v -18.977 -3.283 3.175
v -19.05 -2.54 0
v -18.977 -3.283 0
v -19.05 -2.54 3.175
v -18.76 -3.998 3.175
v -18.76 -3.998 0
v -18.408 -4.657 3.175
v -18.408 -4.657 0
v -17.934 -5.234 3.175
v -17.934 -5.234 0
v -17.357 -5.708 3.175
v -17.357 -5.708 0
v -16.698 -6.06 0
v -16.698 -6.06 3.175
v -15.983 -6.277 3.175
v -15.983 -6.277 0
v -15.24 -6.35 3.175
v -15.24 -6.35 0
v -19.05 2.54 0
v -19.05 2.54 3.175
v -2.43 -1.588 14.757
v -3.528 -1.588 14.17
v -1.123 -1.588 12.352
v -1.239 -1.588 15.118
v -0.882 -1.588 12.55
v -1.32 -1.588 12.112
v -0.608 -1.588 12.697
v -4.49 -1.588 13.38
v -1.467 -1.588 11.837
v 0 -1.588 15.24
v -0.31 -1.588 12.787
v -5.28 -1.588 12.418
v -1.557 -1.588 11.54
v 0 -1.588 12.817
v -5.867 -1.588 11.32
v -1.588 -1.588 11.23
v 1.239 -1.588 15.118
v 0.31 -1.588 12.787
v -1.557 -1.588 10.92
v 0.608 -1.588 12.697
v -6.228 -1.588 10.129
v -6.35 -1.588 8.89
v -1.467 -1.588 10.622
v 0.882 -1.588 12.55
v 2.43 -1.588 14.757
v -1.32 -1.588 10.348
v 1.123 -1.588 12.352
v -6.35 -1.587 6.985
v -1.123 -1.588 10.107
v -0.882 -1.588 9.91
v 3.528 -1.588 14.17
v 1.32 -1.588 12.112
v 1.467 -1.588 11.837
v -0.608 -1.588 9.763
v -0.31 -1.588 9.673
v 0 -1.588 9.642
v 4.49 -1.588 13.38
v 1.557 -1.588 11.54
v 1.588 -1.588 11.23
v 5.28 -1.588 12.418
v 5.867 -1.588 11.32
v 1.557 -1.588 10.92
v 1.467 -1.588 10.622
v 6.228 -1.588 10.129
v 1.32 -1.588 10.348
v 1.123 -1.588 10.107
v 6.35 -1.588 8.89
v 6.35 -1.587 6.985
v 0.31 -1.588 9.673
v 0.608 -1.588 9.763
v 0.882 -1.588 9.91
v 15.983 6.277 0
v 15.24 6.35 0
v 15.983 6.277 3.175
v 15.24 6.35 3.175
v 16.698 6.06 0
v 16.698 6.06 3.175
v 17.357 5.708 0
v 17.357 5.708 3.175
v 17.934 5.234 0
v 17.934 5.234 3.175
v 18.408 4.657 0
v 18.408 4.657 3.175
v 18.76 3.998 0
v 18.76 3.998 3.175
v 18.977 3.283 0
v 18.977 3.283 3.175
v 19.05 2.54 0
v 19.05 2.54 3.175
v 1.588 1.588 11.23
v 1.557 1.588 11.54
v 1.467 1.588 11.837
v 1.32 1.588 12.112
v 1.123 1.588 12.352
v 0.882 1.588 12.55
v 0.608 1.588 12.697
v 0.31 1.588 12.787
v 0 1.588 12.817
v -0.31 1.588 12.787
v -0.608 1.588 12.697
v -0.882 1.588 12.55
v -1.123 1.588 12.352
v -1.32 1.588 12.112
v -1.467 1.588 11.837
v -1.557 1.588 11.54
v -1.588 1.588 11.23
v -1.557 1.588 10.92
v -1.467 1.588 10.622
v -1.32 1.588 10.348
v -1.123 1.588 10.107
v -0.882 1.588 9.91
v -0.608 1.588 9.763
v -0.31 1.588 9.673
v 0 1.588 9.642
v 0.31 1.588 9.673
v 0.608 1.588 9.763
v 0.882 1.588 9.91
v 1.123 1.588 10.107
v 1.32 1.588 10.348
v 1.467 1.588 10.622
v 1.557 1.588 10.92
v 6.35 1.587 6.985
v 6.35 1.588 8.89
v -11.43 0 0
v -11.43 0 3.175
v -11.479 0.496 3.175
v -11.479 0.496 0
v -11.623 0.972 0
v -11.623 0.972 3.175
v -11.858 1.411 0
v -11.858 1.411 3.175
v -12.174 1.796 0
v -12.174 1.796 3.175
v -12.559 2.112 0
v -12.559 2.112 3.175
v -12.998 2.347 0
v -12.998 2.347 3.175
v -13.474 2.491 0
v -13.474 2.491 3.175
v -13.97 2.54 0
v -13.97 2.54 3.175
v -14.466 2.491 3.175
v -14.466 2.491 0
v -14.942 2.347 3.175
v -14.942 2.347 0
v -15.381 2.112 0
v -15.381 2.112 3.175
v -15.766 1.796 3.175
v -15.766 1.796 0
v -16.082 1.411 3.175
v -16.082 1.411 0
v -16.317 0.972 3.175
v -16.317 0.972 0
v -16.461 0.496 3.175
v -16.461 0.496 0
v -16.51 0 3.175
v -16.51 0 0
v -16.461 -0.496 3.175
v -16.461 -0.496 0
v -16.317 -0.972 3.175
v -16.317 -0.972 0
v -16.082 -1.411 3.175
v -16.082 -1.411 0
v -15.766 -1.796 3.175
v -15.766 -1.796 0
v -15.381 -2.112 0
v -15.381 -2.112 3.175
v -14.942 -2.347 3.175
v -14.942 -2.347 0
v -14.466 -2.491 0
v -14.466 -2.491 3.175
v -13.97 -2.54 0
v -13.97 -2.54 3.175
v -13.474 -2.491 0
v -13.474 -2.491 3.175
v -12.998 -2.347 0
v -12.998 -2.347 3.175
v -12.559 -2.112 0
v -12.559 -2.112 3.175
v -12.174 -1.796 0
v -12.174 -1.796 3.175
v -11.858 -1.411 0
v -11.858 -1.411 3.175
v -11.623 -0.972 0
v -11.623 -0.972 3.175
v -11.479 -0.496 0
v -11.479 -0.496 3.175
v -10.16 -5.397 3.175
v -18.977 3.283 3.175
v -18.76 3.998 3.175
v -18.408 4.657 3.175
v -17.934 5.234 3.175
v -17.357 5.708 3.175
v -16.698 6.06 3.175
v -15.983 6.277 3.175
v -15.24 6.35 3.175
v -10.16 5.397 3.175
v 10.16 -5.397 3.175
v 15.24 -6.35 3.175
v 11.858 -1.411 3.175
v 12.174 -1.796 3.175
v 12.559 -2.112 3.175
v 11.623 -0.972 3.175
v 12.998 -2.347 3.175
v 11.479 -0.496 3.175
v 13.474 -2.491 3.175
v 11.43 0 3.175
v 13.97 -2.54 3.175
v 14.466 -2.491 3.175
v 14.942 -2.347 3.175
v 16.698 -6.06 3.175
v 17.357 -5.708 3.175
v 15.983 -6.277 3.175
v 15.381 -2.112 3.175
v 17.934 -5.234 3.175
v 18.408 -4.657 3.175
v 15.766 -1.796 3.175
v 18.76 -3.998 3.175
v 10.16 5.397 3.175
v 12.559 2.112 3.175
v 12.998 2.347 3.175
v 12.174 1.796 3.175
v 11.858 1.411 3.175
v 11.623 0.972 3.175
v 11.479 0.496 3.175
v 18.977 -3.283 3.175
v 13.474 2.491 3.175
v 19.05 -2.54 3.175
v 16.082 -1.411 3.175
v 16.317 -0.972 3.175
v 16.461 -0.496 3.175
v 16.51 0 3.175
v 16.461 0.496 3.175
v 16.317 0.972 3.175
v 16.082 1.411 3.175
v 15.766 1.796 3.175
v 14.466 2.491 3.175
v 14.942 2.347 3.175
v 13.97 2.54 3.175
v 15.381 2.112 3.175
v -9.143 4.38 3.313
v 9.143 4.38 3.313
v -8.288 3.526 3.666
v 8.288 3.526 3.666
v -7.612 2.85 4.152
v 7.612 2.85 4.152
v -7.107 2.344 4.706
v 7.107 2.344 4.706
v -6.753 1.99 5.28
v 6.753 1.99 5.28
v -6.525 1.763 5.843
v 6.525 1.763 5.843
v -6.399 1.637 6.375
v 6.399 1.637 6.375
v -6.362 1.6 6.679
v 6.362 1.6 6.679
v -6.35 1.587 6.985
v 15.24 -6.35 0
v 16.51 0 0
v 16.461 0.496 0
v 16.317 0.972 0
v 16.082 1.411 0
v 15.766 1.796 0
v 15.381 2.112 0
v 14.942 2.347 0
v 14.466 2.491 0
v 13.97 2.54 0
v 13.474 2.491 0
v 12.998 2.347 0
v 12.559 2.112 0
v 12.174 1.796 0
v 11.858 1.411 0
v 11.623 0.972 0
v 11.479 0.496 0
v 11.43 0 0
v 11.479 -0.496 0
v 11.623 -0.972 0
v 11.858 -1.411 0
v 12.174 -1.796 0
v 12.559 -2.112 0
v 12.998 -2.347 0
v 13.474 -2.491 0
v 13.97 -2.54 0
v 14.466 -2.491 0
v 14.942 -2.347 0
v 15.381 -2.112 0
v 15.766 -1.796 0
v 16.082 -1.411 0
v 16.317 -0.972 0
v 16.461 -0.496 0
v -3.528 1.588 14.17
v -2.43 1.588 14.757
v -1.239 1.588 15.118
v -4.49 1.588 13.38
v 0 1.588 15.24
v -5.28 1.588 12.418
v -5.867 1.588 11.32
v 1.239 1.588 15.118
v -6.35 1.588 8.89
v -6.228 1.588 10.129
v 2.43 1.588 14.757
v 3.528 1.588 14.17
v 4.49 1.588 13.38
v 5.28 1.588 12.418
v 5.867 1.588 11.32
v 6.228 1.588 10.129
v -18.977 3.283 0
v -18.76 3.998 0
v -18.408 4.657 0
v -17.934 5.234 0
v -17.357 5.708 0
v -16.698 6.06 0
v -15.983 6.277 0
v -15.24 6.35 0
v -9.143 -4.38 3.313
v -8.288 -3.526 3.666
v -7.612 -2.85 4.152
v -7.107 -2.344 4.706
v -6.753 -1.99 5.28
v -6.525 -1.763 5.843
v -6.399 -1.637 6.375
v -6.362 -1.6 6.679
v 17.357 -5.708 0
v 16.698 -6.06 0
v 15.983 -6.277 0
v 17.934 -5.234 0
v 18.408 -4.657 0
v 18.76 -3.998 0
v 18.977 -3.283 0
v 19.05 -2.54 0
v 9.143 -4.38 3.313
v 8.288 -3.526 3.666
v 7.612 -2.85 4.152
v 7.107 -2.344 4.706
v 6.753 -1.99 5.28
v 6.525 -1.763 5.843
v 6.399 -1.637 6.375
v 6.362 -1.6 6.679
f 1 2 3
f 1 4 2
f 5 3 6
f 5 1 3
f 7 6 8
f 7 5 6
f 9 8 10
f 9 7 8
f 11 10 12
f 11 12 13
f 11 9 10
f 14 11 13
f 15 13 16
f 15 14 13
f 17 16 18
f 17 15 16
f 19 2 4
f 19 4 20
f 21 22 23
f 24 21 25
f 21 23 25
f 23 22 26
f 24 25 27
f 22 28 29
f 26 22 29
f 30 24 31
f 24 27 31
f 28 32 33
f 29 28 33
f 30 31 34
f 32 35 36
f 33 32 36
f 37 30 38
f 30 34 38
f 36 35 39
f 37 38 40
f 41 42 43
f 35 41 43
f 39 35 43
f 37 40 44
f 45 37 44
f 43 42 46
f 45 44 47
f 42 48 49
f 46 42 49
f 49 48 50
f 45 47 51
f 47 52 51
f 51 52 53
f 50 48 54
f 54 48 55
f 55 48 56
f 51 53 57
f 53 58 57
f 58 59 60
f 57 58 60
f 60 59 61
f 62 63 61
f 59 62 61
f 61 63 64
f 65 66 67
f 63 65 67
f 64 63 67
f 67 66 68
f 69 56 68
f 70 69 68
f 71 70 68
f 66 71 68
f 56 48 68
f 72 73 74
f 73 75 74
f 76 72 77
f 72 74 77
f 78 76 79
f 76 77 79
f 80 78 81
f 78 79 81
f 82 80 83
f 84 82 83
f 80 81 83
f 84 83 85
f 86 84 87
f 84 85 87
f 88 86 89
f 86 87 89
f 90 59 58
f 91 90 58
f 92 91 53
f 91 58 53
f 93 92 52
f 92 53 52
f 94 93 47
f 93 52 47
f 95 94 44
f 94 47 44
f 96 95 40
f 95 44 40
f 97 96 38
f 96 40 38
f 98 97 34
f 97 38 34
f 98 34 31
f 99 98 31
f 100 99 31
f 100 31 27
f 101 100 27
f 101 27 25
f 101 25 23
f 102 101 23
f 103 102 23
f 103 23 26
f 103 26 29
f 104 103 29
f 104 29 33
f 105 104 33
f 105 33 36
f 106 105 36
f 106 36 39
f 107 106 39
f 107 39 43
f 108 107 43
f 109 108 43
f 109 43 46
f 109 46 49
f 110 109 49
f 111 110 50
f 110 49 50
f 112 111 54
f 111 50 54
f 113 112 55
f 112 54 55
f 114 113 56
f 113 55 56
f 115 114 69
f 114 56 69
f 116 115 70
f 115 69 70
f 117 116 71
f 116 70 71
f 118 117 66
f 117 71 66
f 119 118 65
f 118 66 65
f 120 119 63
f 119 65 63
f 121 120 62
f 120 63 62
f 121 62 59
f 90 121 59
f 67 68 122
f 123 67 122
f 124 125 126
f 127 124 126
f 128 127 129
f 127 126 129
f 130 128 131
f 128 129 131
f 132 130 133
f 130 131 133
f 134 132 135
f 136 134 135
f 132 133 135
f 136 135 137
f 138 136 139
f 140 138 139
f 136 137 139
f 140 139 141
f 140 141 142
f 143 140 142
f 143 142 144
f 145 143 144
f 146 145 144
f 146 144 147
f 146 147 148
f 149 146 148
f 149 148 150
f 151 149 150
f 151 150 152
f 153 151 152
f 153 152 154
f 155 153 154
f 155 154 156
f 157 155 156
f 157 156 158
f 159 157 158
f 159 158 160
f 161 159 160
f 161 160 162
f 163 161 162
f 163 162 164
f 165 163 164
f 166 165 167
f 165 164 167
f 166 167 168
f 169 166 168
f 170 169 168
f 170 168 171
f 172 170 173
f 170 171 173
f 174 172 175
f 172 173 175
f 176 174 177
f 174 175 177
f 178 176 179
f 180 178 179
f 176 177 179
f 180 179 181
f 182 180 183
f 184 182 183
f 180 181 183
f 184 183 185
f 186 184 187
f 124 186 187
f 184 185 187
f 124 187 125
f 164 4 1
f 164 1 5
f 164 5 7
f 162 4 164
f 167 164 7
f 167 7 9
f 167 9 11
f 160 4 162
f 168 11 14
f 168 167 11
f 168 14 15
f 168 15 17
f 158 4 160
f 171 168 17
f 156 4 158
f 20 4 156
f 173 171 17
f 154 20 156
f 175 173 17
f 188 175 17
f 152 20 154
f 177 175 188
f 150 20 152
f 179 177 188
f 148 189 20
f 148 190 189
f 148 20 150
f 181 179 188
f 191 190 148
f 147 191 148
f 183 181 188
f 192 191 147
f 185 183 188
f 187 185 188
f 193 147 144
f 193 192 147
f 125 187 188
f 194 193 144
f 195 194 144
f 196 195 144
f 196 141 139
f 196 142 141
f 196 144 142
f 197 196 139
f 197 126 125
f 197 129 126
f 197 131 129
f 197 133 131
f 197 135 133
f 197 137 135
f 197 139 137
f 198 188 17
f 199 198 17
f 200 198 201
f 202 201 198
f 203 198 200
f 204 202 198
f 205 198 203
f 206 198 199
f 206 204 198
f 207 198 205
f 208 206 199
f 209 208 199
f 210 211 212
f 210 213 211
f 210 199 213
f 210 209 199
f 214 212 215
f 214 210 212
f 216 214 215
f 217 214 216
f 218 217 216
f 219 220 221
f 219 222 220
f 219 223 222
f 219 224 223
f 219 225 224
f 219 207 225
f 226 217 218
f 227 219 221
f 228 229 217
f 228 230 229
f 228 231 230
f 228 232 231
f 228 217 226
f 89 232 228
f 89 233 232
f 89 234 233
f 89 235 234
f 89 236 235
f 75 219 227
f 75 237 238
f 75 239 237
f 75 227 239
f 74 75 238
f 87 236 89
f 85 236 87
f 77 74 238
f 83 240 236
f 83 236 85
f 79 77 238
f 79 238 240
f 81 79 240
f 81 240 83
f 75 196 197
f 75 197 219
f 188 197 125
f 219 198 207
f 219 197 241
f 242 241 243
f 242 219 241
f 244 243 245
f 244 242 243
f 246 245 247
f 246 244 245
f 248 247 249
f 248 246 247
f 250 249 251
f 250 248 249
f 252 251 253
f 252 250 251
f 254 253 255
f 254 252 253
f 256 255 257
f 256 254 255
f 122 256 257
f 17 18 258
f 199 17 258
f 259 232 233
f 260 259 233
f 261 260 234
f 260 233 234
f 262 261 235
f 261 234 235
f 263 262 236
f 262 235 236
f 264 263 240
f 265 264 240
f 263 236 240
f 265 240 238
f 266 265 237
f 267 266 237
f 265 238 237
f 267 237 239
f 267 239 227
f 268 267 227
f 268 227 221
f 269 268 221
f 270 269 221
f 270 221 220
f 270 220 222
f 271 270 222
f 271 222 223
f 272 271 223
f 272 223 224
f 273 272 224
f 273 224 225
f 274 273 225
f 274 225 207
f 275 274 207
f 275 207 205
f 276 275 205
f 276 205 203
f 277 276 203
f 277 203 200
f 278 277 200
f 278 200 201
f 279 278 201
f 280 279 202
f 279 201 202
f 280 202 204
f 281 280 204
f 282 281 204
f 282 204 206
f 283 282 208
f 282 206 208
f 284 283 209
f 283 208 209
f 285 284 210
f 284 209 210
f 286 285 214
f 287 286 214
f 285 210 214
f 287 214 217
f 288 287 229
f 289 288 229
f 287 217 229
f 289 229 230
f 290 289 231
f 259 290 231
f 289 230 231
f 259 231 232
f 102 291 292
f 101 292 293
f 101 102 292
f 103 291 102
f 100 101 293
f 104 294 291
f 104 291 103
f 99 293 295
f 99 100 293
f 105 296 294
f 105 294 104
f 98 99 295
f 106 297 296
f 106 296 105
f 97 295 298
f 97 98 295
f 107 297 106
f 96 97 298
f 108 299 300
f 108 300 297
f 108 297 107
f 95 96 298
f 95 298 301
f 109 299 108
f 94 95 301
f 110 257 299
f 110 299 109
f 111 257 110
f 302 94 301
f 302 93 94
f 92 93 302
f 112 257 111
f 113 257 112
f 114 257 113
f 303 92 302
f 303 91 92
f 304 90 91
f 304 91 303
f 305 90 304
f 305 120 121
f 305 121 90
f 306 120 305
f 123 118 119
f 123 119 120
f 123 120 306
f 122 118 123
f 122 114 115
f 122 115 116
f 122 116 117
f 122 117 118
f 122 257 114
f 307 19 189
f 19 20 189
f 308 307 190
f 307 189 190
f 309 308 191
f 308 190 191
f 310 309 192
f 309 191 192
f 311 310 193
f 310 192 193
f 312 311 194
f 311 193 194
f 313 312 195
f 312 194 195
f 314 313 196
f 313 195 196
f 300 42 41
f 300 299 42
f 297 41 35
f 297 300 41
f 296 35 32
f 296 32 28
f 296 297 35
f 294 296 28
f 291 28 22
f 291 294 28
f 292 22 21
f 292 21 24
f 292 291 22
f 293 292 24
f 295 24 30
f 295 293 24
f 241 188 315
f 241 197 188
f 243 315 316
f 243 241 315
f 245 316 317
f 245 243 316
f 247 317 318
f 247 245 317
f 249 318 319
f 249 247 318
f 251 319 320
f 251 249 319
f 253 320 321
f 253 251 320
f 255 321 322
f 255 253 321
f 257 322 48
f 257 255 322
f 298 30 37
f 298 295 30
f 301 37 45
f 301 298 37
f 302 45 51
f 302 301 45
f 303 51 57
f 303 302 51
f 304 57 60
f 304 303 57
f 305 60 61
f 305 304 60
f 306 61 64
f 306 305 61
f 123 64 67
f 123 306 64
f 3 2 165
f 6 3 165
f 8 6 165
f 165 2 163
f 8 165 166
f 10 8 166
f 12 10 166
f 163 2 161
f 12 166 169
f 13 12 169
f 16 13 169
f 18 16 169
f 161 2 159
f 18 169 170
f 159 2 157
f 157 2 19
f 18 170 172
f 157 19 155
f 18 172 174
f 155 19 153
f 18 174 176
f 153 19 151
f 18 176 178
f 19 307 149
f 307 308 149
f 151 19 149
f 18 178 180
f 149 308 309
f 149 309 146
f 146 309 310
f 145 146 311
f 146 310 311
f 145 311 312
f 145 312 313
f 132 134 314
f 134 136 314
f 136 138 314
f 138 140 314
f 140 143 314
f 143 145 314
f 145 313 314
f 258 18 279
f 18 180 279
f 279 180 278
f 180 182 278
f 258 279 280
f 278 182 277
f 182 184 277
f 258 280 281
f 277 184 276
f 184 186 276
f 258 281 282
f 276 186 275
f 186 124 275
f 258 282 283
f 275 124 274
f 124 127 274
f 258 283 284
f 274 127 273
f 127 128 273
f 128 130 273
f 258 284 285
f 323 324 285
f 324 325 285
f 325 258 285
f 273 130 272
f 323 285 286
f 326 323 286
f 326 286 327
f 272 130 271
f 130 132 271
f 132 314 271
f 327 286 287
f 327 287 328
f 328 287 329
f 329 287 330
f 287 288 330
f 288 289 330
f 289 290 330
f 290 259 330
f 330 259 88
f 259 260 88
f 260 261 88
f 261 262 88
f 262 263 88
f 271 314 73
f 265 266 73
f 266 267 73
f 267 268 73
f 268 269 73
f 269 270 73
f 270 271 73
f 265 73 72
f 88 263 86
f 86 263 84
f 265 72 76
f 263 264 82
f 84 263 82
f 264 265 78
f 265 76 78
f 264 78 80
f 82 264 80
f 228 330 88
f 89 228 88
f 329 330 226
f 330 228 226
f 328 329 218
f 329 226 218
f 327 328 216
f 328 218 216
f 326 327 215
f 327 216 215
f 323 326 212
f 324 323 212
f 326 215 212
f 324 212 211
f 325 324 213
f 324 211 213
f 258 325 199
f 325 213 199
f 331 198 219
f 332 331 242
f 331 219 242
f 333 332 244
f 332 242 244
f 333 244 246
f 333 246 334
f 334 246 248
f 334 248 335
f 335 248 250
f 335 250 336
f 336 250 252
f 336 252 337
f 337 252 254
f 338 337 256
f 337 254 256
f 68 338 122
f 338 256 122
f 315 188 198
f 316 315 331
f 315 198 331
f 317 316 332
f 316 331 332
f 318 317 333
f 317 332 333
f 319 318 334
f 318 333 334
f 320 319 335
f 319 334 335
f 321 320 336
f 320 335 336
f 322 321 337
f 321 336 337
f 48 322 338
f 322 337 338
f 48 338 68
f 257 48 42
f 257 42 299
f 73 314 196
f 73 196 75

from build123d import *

# Parameters (mm, degrees)
F0_W     = 38.1
F0_H     = 12.7
F0_W_2   = 12.7
F0_H_2   = 3.175
F1_DEPTH = 3.175
F2_DEPTH = 15.24
F3_R     = 6.34999
F4_R     = 3.81
F5_R     = 1.5875
F6_DEPTH = 12.701
F7_R     = 2.54
F8_DEPTH = 3.176


# Not quite as in the source:
# - a fillet or chamfer is up to 0.001 mm smaller than in the source, because OpenCascade refuses the exact size


with BuildPart() as f1:
    # F0 (on Top) → F1 (new body)
    with BuildSketch(Plane.XY):
        Rectangle(F0_W, F0_H)
        Rectangle(F0_W_2, F0_H_2, mode=Mode.SUBTRACT)
    extrude(amount=F1_DEPTH)

    # F0 (on Top) → F2 (join)
    with BuildSketch(Plane.XY):
        Rectangle(F0_W_2, F0_H_2)
    extrude(amount=F2_DEPTH)

    # F3 (radius 6.35 in the source; OpenCascade refuses exactly that, so slightly less here)
    f3_edges = [f1.edges().sort_by_distance(p)[0] for p in [
        (-6.35, 0, 15.24),
        (6.35, 0, 15.24),
    ]]
    fillet(f3_edges, radius=F3_R)

    # F4 (call 1 of 5: OpenCascade refuses the feature's edges together)
    f4_edges = [f1.edges().sort_by_distance(p)[0] for p in [
        (-19.05, -6.35, 1.5875),
    ]]
    fillet(f4_edges, radius=F4_R)

    # F4#2 (call 2 of 5)
    f4_2_edges = [f1.edges().sort_by_distance(p)[0] for p in [
        (-19.05, 6.35, 1.5875),
    ]]
    fillet(f4_2_edges, radius=F4_R)

    # F4#3 (call 3 of 5)
    f4_3_edges = [f1.edges().sort_by_distance(p)[0] for p in [
        (19.05, 6.35, 1.5875),
    ]]
    fillet(f4_3_edges, radius=F4_R)

    # F4#4 (call 4 of 5)
    f4_4_edges = [f1.edges().sort_by_distance(p)[0] for p in [
        (19.05, -6.35, 1.5875),
    ]]
    fillet(f4_4_edges, radius=F4_R)

    # F4#5 (call 5 of 5)
    f4_5_edges = [f1.edges().sort_by_distance(p)[0] for p in [
        (0, -1.5875, 3.175),
        (0, 1.5875, 3.175),
        (6.35, 0, 3.175),
        (-6.35, 0, 3.175),
    ]]
    fillet(f4_5_edges, radius=F4_R)

    # F5 (on face) → F6 (cut, through all)
    with BuildSketch(Plane.XZ.offset(6.35)):
        with Locations((0, 11.2299183384)):
            Circle(F5_R)
    extrude(amount=-F6_DEPTH, mode=Mode.SUBTRACT)

    # F7 (on face) → F8 (cut, through all)
    with BuildSketch(Plane.XY.offset(3.175)):
        with Locations((-13.97, 0)):
            Circle(F7_R)
        with Locations((13.97, 0)):
            Circle(F7_R)
    extrude(amount=-F8_DEPTH, mode=Mode.SUBTRACT)


solid = f1.part
